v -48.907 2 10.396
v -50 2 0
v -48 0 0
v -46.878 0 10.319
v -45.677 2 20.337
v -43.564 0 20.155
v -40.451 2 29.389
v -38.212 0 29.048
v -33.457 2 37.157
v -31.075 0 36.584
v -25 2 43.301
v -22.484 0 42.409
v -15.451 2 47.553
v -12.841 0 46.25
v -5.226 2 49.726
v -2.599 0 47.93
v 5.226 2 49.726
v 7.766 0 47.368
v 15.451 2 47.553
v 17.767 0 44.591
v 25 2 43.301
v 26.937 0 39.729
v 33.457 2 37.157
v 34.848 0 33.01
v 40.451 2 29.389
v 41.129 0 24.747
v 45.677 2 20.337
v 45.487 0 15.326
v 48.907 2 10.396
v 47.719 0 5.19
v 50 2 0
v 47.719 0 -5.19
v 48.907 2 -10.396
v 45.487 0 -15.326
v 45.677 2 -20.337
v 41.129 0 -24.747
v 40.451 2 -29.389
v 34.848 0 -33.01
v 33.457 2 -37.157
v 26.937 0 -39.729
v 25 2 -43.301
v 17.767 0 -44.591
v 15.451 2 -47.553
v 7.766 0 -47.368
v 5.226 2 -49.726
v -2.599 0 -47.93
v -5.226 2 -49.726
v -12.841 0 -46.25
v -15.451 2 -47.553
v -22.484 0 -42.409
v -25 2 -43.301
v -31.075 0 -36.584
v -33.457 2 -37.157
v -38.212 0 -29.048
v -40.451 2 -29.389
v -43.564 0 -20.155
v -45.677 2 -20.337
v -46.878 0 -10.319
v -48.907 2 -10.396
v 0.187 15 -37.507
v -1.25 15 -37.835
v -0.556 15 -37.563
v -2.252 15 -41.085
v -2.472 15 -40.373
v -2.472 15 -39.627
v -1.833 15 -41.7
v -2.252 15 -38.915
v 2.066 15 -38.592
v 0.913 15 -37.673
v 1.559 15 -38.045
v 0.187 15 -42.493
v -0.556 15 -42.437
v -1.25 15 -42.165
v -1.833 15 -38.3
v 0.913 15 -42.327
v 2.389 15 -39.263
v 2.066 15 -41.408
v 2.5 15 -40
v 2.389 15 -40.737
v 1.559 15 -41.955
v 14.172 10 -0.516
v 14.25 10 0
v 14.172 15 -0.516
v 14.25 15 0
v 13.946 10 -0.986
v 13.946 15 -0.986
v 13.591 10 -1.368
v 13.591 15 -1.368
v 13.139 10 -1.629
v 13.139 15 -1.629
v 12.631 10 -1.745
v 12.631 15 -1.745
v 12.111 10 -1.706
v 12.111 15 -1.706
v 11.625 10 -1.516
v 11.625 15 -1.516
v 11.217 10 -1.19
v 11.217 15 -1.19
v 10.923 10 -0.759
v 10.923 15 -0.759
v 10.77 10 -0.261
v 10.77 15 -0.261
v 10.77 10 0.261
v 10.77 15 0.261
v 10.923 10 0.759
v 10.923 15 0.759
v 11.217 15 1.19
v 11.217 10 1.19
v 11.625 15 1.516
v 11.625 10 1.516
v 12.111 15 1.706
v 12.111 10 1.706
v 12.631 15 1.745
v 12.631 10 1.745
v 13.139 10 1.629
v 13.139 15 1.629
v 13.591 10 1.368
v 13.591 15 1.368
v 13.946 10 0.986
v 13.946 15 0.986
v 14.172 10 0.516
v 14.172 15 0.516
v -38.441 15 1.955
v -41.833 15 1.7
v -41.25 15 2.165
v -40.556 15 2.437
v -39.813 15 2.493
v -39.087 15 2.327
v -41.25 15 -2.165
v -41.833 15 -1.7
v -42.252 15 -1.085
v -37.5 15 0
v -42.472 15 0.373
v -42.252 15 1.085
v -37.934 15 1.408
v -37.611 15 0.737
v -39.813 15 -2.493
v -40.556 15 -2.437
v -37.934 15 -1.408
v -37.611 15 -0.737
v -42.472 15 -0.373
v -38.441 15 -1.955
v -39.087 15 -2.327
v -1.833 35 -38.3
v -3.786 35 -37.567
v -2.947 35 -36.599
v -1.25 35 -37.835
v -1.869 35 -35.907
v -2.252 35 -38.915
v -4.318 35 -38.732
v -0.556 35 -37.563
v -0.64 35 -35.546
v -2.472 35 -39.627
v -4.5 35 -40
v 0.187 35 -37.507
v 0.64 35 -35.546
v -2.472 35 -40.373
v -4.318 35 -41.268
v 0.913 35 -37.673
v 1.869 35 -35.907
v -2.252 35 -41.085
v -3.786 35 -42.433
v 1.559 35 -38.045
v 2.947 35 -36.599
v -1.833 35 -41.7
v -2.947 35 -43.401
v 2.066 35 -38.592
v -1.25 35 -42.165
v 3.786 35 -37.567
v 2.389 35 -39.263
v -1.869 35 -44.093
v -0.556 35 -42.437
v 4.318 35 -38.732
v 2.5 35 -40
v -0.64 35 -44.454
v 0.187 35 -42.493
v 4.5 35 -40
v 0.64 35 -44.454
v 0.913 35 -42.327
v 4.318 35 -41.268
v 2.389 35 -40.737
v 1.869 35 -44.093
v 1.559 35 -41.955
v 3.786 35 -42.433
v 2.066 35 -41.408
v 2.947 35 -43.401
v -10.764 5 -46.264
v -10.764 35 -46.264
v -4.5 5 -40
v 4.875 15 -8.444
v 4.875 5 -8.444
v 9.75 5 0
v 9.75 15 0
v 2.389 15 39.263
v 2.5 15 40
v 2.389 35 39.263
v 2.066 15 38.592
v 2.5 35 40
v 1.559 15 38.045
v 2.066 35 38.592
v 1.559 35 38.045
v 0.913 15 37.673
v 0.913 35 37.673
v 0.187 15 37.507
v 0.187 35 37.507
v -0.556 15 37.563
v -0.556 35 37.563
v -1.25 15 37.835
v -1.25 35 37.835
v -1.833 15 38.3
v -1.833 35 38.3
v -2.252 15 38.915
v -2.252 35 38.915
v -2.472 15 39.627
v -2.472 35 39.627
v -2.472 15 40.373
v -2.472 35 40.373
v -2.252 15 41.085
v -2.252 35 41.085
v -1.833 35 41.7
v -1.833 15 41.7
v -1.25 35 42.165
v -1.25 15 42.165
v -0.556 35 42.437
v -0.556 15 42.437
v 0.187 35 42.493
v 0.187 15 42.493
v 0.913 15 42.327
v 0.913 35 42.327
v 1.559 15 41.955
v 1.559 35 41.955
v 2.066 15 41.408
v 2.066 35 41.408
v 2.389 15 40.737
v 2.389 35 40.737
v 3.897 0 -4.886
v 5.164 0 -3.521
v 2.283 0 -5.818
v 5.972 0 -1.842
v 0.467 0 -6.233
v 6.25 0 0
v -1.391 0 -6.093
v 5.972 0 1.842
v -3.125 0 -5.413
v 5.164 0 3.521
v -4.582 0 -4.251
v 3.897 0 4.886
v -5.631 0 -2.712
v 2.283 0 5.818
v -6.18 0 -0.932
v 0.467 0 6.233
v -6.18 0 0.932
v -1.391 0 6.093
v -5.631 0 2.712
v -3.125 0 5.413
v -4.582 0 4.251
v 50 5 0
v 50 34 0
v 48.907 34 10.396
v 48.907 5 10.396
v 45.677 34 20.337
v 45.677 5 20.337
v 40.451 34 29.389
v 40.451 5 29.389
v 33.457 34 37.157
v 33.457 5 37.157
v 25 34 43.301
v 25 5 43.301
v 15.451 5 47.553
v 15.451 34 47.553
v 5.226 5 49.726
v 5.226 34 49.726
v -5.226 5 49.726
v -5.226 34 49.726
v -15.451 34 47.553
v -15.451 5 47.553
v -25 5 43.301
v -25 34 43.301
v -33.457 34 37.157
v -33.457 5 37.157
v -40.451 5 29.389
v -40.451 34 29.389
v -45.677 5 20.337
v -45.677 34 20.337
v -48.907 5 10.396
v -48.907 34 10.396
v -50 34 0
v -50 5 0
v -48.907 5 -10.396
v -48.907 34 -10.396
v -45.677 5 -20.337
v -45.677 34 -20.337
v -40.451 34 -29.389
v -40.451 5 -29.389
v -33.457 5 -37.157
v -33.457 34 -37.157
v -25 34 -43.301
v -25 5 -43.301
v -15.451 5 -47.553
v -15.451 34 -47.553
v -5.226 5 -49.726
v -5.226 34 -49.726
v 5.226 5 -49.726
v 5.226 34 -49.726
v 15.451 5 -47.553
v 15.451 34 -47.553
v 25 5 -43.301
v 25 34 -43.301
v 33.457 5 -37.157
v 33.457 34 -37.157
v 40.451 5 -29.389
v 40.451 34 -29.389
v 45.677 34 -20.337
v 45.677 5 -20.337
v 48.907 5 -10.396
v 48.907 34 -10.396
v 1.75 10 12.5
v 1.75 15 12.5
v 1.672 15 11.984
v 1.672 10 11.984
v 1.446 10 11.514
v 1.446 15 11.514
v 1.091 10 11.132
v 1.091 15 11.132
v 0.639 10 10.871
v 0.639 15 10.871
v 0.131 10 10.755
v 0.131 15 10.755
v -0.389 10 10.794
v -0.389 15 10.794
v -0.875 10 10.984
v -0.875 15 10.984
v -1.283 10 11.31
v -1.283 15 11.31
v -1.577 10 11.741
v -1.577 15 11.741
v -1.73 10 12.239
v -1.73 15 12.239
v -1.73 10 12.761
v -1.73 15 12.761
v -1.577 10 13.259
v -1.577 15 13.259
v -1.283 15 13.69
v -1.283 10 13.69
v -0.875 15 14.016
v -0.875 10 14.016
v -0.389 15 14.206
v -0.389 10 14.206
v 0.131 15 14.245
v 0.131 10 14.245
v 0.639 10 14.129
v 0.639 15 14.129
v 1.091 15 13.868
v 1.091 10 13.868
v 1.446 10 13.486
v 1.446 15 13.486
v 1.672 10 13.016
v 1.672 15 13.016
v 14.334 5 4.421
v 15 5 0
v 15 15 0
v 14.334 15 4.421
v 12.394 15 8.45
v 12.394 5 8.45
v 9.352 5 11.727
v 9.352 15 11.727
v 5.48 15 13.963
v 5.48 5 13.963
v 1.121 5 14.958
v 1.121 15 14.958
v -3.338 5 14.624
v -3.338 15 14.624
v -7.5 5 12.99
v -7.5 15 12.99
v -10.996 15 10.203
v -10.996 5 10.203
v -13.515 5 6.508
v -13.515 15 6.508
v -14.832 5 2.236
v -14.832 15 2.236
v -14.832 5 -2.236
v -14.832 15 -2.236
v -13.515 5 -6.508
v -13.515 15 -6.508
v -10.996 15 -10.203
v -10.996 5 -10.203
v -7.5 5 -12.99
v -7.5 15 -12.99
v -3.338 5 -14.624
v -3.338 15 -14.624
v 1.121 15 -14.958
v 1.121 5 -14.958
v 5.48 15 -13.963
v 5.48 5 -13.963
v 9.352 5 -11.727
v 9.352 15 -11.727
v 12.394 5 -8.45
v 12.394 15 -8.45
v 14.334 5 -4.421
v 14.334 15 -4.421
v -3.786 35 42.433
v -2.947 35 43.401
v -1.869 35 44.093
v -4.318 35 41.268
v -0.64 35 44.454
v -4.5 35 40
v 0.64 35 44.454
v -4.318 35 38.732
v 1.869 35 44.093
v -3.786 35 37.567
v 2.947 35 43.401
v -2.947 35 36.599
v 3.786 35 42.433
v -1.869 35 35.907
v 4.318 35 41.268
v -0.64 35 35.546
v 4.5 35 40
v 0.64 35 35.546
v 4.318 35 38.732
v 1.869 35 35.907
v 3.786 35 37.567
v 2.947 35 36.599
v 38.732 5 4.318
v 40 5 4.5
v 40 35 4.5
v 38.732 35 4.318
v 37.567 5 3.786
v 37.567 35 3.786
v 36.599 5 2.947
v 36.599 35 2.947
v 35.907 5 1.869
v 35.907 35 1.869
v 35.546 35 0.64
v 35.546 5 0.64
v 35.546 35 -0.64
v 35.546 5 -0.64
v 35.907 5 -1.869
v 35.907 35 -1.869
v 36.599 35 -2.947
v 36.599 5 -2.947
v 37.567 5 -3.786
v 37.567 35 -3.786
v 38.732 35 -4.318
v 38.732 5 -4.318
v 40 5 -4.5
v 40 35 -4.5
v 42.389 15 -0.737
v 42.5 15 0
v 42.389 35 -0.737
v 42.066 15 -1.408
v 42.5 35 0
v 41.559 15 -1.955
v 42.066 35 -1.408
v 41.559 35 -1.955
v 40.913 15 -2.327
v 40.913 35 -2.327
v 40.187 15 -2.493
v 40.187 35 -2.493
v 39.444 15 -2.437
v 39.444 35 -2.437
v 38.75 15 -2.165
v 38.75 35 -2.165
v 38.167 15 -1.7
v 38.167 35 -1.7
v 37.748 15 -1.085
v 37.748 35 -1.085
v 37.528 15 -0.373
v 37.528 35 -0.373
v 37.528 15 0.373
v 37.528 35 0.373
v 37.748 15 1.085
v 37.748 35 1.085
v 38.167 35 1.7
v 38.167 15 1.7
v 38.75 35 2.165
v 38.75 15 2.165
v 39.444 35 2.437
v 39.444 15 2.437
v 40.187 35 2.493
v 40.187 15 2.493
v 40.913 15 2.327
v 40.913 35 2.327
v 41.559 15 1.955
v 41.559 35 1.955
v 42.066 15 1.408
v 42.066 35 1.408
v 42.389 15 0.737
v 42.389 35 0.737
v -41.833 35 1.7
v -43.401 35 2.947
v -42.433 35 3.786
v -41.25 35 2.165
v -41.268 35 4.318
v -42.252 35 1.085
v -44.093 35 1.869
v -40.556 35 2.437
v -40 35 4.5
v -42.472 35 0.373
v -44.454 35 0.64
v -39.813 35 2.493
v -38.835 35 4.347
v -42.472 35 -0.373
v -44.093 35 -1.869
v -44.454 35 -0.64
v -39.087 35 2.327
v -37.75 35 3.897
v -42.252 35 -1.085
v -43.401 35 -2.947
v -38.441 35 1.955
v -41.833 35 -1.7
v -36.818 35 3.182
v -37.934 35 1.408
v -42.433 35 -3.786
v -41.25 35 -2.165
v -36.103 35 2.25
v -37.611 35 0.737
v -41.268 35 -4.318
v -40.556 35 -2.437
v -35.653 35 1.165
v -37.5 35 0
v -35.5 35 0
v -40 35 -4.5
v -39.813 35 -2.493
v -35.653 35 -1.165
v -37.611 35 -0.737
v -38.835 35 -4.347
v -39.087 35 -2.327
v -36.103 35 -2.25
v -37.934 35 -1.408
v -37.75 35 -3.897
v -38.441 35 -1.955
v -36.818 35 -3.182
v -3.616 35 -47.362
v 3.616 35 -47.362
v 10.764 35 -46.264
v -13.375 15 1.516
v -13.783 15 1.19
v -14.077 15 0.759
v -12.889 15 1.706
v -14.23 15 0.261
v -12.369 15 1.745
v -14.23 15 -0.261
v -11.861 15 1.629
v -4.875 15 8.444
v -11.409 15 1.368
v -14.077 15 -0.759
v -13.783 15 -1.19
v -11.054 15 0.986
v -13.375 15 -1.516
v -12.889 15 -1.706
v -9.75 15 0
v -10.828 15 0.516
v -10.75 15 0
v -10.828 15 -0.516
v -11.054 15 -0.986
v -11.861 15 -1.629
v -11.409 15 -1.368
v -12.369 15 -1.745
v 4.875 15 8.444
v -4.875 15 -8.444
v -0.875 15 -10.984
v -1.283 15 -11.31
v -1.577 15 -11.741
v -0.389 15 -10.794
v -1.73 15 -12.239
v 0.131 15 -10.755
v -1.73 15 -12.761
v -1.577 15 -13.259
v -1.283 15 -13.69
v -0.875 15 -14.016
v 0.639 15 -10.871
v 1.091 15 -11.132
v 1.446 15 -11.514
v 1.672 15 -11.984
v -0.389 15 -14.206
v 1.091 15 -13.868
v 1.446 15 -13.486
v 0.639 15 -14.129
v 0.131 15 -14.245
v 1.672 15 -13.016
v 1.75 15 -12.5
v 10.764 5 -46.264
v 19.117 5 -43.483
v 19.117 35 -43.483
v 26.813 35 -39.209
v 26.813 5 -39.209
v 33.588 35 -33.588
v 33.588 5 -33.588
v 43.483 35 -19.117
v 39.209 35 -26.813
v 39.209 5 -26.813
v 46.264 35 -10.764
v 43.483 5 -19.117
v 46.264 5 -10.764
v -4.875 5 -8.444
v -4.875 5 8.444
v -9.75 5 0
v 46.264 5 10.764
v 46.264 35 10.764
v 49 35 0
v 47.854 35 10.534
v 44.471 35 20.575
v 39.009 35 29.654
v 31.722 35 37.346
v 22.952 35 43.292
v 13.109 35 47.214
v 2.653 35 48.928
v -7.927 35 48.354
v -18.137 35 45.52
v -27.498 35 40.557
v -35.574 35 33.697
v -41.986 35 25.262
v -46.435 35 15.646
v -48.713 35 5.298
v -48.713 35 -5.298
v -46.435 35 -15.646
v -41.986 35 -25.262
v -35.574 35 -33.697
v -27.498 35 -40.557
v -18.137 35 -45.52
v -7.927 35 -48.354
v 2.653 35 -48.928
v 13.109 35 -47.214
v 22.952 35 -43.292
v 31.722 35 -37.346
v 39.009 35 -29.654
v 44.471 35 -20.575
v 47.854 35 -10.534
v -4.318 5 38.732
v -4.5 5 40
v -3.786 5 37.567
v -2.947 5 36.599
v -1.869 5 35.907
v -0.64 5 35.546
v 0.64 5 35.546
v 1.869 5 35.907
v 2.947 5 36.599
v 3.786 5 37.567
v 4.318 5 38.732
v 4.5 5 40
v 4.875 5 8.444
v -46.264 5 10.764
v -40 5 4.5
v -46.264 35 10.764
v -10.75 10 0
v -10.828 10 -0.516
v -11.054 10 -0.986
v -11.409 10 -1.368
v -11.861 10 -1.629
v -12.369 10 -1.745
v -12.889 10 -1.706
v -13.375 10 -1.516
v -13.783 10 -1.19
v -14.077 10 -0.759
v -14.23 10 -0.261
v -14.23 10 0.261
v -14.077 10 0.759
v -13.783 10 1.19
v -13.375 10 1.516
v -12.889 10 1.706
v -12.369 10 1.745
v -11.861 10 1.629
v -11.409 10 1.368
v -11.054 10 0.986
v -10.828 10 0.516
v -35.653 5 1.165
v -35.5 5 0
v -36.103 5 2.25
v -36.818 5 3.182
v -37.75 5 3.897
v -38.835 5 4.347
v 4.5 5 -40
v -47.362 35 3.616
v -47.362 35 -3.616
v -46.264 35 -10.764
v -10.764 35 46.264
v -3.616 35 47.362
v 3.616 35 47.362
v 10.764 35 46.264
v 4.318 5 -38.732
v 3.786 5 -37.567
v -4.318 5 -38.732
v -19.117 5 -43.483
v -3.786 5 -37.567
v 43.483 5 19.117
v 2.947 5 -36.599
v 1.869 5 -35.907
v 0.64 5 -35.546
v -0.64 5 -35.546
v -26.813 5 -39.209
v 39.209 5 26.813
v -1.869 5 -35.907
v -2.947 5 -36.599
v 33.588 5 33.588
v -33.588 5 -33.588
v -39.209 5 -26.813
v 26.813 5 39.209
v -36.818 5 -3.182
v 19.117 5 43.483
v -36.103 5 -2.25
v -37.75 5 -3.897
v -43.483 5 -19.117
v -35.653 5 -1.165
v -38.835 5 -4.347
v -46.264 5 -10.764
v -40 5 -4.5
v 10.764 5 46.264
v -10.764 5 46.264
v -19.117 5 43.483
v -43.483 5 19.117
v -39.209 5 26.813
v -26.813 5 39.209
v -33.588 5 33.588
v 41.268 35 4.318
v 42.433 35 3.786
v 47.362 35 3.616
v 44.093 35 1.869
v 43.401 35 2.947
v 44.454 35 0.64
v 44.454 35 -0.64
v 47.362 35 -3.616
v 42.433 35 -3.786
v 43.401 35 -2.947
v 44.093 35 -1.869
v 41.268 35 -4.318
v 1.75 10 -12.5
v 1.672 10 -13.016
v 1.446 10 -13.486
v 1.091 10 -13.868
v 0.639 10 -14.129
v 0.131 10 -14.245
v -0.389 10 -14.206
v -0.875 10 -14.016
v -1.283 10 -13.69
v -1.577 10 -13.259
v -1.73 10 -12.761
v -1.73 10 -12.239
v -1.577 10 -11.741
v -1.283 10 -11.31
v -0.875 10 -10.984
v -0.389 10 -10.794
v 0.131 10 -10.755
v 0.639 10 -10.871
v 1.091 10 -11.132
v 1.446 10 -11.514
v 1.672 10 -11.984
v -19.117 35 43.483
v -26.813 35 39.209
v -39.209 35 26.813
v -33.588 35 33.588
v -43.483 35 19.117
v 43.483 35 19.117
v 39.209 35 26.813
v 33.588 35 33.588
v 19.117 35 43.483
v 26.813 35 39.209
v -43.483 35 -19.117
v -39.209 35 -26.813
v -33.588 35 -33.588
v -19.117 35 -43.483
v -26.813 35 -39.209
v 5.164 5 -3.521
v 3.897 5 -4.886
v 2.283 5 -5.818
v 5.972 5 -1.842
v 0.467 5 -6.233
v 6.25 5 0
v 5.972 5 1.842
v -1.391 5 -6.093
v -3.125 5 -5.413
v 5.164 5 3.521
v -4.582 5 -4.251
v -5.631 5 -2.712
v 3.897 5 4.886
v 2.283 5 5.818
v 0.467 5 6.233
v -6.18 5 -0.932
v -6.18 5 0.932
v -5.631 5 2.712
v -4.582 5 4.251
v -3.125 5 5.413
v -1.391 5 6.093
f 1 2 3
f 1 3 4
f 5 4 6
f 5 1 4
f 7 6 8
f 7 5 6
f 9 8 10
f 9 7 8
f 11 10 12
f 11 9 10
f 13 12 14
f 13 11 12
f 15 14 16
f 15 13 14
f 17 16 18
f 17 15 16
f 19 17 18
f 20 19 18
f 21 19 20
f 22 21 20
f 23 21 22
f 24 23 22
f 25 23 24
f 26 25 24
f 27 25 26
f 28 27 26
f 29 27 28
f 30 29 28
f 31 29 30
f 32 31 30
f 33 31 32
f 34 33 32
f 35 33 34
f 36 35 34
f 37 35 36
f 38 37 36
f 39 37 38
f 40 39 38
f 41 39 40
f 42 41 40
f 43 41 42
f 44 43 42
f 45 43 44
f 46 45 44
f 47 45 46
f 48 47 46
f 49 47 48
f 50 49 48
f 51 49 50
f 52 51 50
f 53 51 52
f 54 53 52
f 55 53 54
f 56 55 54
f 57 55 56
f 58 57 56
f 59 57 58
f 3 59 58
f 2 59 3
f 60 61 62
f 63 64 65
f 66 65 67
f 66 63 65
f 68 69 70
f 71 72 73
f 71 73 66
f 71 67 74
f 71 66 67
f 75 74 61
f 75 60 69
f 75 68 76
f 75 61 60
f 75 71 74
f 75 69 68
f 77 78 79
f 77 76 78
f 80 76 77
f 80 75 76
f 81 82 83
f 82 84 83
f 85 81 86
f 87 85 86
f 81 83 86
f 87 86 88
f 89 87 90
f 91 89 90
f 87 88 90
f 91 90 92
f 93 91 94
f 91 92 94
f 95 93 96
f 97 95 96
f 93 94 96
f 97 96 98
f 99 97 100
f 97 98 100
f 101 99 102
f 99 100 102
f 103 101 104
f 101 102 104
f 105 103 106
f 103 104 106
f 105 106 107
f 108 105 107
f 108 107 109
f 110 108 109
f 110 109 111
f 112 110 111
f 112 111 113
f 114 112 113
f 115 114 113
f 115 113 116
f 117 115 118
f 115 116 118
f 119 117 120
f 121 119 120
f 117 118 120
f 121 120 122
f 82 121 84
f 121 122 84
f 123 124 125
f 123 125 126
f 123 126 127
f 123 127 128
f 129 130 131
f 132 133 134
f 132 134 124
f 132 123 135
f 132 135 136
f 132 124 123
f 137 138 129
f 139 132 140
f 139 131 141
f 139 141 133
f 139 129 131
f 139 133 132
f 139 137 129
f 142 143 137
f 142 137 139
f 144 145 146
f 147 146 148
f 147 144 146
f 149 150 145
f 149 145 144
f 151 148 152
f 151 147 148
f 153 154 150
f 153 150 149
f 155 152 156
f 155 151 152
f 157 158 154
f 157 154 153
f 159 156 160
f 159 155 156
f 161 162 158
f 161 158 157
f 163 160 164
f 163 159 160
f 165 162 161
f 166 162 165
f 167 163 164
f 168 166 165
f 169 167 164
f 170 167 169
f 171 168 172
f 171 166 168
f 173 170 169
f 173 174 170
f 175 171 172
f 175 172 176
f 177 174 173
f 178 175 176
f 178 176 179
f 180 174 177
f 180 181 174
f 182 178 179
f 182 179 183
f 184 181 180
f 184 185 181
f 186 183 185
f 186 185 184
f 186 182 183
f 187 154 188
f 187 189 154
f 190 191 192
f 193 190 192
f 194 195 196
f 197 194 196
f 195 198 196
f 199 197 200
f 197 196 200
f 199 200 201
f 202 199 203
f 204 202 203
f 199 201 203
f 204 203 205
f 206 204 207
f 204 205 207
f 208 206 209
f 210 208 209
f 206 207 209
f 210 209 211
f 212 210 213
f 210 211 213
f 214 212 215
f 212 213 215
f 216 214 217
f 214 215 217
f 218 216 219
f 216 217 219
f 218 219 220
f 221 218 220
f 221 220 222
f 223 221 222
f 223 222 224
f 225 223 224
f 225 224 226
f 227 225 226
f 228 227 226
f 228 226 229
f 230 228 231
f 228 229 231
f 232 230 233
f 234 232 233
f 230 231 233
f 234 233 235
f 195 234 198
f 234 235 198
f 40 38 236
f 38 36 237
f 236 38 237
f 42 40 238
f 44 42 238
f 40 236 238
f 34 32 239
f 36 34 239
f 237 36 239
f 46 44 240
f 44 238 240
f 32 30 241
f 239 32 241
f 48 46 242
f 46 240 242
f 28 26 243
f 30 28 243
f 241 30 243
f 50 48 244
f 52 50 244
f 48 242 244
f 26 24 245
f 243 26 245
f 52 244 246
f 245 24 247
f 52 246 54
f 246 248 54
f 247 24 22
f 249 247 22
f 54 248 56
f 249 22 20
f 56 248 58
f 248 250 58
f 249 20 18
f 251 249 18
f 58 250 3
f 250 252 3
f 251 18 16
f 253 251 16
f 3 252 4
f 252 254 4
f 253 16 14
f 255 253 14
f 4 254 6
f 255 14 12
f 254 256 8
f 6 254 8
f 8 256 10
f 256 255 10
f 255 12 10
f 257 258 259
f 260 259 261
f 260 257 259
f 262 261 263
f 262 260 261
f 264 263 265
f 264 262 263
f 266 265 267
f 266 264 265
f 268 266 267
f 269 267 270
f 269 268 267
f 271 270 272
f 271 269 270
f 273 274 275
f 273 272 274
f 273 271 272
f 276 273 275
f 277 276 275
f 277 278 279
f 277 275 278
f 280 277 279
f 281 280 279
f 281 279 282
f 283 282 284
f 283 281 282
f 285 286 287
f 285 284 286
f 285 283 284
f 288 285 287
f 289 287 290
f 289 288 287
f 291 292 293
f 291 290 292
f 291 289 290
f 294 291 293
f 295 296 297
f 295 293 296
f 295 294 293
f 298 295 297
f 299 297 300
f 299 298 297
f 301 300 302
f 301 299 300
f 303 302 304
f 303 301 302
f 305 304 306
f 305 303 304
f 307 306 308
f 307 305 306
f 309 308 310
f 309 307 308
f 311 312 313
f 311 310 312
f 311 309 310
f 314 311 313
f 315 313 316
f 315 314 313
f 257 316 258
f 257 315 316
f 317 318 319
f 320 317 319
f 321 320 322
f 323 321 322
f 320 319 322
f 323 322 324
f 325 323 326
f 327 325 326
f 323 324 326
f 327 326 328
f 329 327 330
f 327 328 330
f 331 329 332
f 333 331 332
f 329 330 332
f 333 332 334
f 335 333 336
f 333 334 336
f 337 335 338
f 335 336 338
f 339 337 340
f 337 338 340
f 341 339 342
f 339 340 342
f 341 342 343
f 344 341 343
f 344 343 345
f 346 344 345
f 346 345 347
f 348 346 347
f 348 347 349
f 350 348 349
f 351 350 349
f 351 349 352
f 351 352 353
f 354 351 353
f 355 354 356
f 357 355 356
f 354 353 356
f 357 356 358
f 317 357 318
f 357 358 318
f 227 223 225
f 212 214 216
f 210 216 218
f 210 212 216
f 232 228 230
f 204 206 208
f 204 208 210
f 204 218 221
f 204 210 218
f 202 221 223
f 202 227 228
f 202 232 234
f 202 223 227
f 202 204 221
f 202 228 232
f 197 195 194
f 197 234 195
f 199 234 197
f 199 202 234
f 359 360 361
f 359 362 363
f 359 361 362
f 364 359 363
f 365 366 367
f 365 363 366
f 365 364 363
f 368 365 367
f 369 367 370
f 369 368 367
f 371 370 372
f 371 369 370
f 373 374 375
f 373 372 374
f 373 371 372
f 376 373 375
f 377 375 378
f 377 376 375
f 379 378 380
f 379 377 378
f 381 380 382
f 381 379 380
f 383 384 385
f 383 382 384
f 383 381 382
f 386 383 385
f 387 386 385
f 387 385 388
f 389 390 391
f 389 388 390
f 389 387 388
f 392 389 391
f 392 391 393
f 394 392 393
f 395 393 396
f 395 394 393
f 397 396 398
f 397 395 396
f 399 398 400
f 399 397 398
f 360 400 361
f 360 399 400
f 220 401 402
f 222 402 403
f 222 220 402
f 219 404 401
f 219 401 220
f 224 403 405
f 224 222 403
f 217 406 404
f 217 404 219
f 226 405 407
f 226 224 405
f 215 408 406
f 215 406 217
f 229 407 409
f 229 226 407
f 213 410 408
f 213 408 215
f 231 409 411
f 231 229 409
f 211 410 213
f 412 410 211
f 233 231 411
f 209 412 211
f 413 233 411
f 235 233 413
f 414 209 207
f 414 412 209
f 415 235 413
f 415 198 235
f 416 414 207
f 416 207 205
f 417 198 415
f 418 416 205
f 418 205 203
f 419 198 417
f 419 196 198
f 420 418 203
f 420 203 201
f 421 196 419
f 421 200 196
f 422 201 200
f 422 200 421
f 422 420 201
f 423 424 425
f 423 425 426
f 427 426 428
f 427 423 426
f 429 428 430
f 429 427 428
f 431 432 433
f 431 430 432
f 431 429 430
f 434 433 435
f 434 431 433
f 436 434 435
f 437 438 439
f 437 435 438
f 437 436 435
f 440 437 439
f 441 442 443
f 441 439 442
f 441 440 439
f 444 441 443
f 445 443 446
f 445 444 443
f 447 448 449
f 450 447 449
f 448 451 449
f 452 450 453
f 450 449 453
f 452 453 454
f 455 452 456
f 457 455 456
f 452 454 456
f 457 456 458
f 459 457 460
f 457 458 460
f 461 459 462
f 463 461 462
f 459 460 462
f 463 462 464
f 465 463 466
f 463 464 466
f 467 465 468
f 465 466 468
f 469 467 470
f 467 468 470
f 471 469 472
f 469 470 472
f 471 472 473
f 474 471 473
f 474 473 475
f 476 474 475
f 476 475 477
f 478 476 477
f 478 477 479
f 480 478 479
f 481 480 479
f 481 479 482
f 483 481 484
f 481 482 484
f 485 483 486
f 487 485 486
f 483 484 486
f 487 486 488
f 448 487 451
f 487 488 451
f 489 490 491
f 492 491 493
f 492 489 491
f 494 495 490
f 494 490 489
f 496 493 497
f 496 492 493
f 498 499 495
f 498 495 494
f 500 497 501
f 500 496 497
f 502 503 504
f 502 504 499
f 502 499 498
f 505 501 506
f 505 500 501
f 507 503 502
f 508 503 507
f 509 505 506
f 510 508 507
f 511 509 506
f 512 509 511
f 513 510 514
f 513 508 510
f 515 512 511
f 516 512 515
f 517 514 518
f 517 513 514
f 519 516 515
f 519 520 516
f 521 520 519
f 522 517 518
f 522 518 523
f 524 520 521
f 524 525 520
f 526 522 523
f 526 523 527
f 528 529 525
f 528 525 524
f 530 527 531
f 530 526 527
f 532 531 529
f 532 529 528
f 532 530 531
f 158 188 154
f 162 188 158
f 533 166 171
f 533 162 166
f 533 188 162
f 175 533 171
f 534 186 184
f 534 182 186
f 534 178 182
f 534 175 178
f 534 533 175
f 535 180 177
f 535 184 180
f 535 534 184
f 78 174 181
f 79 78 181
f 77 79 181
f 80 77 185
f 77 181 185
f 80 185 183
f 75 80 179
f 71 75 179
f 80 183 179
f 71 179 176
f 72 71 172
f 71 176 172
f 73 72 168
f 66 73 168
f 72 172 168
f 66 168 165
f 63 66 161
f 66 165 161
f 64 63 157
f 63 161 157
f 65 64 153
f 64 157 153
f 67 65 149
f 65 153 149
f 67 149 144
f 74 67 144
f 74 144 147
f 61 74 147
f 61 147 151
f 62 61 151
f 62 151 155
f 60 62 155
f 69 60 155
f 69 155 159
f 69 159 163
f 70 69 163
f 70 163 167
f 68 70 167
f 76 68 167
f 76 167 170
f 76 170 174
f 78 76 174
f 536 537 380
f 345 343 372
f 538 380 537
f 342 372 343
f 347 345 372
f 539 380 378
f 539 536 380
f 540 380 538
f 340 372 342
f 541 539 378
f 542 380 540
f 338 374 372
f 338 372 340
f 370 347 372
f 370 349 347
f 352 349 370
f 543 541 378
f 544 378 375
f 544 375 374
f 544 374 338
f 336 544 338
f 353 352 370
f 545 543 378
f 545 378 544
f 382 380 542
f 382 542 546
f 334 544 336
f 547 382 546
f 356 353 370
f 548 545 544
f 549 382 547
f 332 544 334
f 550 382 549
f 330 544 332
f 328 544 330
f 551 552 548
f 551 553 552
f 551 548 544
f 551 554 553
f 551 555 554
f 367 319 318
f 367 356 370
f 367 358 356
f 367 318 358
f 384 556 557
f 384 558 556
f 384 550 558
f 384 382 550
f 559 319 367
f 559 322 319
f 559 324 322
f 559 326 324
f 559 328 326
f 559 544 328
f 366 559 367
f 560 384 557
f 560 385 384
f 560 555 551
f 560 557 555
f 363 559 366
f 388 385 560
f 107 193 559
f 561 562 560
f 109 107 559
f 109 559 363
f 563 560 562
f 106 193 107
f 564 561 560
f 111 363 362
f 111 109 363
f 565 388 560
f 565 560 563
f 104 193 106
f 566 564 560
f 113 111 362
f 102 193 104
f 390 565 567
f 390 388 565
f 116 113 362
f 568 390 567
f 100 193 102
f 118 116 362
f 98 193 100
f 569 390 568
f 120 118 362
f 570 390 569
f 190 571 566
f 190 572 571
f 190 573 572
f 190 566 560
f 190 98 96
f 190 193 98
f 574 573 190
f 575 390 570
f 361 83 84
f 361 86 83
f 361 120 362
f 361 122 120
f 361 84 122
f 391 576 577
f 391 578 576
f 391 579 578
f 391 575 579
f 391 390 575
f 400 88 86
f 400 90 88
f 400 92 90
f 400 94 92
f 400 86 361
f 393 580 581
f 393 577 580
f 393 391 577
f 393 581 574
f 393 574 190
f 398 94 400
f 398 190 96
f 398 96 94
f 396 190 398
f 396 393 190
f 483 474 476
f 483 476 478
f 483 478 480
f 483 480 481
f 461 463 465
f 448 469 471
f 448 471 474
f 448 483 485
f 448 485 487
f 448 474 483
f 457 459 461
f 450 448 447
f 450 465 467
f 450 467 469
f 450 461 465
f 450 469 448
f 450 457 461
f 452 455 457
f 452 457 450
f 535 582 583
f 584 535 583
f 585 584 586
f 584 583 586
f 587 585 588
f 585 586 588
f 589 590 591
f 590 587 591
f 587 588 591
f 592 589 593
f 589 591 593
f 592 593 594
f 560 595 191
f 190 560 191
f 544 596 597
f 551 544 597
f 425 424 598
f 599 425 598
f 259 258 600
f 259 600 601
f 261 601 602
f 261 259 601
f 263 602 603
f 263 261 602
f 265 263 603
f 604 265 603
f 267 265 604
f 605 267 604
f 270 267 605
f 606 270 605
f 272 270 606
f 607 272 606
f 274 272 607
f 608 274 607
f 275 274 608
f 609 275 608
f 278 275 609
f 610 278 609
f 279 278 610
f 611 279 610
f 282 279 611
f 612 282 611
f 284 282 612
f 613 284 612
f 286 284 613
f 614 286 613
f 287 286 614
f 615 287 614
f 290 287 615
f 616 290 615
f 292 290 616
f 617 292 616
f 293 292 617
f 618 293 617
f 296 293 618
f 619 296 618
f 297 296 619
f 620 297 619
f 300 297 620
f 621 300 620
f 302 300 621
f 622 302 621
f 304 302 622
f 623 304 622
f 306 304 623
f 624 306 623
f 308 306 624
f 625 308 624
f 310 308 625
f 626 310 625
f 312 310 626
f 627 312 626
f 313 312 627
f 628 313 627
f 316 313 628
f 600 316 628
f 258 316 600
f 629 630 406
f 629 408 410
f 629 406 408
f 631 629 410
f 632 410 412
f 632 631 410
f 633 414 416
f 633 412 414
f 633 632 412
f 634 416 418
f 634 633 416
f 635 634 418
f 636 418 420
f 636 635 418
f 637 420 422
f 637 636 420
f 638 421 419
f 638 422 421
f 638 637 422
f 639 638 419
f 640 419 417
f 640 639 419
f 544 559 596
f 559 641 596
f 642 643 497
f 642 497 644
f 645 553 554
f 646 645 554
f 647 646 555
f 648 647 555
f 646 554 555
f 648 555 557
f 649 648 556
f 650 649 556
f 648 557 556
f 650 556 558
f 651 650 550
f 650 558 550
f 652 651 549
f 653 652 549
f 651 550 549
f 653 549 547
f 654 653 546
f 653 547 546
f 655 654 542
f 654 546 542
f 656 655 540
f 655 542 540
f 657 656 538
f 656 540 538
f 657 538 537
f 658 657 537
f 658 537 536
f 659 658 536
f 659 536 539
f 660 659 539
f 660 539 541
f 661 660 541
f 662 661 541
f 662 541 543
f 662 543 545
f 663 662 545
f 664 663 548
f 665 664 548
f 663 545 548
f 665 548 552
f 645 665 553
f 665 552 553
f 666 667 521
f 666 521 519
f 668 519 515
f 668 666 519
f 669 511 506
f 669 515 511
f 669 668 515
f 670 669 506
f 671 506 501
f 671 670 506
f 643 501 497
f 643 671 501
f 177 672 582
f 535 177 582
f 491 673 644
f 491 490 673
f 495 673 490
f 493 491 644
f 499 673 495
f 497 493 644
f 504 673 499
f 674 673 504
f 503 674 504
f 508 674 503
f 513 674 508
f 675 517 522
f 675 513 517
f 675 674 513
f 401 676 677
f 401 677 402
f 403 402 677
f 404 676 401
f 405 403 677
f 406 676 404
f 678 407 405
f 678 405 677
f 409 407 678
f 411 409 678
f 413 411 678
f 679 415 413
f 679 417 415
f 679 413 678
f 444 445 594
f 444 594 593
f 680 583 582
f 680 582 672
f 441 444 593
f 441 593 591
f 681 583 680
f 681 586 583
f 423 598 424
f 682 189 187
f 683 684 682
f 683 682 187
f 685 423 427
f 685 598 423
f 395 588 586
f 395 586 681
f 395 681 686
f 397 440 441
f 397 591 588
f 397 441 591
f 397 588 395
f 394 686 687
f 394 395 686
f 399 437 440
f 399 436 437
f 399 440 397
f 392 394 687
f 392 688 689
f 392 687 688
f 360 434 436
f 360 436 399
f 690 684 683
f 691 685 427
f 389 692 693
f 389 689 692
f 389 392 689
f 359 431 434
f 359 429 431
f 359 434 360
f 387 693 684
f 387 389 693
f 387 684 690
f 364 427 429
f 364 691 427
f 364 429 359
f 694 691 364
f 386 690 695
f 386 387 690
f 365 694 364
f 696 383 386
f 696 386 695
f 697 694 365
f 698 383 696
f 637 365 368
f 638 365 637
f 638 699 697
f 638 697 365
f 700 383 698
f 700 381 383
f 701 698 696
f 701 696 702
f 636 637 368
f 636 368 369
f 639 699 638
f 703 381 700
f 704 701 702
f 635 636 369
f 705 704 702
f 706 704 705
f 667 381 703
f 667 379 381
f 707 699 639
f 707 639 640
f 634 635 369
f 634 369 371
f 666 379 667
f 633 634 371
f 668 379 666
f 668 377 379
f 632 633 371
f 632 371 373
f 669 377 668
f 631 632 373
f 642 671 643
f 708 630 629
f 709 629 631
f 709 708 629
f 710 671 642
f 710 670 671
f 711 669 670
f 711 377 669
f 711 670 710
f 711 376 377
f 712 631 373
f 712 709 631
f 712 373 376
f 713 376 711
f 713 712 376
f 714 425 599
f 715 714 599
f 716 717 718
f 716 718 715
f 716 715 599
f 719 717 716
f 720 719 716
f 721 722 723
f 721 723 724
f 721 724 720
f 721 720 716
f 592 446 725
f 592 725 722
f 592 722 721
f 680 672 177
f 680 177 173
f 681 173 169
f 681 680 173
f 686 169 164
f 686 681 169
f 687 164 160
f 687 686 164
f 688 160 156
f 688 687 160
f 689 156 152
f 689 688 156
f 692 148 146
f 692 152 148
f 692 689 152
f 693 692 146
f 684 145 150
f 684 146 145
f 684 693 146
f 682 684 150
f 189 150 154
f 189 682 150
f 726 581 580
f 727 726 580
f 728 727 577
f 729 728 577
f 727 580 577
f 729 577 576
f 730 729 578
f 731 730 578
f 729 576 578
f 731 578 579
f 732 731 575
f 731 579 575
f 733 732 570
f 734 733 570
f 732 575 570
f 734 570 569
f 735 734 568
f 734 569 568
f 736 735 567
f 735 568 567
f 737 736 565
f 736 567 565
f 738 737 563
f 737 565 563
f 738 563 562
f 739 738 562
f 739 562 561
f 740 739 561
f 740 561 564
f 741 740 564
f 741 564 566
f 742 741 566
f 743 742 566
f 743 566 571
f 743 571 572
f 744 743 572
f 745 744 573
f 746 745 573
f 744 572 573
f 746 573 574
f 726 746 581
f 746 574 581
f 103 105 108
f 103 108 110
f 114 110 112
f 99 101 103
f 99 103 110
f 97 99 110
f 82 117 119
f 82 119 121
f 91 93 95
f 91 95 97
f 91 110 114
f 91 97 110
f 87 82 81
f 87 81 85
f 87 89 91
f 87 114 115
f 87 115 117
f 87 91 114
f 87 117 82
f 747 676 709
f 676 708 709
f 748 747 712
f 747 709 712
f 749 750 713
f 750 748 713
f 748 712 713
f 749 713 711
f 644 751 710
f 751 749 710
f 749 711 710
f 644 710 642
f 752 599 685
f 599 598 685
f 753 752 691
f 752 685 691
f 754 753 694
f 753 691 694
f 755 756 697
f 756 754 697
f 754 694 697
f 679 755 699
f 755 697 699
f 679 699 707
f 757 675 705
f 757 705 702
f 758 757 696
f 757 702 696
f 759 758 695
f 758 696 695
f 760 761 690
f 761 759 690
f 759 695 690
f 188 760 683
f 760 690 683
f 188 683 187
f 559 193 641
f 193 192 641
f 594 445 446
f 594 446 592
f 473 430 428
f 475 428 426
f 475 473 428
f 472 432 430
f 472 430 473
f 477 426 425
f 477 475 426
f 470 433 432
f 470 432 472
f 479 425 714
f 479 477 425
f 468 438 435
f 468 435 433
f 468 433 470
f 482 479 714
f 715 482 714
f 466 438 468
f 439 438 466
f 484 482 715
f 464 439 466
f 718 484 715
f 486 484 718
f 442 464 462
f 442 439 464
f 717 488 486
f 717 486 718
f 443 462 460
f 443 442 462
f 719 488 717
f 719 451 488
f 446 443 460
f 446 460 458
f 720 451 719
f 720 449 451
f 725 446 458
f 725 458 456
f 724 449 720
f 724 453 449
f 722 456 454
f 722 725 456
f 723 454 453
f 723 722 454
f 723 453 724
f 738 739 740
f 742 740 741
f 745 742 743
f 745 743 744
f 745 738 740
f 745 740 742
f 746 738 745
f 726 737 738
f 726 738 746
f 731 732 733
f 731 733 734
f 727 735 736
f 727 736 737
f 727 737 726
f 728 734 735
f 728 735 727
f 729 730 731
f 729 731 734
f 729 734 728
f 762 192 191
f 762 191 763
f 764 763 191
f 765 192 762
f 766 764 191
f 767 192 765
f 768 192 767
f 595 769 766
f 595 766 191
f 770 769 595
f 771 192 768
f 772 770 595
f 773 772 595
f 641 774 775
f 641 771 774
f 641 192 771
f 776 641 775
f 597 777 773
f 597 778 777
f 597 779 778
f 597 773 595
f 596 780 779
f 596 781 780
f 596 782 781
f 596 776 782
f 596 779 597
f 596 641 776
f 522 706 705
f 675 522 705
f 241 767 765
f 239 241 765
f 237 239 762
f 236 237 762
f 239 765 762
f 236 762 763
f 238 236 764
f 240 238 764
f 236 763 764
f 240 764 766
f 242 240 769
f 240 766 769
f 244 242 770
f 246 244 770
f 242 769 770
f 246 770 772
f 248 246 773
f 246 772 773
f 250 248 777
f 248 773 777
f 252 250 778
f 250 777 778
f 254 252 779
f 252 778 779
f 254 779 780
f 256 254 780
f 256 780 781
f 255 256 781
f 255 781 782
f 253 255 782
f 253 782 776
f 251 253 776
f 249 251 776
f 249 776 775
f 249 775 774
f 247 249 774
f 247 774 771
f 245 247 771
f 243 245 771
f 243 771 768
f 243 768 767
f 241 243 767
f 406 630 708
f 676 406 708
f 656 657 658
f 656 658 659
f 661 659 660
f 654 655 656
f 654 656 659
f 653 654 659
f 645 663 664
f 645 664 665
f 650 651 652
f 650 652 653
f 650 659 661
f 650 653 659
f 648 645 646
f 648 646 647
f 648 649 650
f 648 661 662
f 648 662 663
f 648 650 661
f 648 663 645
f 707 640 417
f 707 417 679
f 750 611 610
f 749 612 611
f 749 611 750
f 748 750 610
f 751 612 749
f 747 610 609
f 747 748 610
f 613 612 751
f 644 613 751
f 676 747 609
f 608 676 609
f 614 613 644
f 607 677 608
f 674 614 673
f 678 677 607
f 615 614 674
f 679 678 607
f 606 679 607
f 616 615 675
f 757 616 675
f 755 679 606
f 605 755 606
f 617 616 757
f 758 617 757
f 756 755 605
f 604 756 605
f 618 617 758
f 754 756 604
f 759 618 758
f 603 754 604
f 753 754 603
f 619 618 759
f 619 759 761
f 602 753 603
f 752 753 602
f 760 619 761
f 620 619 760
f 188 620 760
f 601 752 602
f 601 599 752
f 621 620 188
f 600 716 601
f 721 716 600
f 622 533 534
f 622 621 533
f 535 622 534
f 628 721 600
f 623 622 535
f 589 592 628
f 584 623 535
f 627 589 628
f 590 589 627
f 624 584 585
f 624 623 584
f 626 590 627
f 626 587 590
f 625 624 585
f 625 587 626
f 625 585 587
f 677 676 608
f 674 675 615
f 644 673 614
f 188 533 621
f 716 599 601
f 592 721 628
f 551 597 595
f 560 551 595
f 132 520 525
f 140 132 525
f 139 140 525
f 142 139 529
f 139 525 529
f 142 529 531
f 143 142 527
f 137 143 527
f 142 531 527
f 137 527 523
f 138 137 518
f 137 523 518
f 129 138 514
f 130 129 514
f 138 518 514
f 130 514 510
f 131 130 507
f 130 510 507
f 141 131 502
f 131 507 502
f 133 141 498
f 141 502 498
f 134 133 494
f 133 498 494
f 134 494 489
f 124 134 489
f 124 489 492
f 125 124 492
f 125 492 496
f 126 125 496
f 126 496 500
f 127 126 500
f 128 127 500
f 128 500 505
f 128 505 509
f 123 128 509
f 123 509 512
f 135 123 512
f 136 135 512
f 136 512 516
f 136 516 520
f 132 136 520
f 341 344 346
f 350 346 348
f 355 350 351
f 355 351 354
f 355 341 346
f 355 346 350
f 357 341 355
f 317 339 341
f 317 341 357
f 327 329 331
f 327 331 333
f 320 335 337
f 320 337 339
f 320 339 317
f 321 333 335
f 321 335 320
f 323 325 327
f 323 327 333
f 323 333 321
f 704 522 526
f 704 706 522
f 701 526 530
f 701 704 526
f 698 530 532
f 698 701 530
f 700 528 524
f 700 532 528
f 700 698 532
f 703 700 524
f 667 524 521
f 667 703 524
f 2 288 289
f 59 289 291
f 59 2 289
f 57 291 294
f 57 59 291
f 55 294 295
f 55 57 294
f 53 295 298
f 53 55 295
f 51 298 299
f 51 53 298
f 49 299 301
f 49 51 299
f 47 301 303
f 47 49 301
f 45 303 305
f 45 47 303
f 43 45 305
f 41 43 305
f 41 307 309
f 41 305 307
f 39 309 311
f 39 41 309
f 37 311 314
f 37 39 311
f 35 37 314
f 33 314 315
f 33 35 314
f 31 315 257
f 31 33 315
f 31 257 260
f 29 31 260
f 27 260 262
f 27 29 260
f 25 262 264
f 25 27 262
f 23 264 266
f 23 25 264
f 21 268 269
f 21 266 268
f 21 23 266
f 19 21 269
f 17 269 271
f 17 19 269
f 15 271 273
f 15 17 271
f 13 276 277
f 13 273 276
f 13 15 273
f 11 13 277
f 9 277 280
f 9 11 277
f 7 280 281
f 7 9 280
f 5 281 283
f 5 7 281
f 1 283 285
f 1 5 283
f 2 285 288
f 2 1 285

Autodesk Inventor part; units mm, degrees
ref_plane "YZ Plane" through (0, 0, 0) normal (1, 0, 0) x (0, 1, 0)
ref_plane "XZ Plane" through (0, 0, 0) normal (0, 1, 0) x (-1, 0, 0)
ref_plane "XY Plane" through (0, 0, 0) normal (0, 0, 1) x (1, 0, 0)
sketch "Sketch5" plane through (0, 0, 0) normal (0, 1, 0) x (-1, 0, 0)
  circle A0 centre (0, 0) radius 50
  dimension "d10" = 100
extrude "Extrusion4" add sketch "Sketch5" along normal blind 5
sketch "Sketch6" plane through (0, 5, 0) normal (0, 1, 0) x (1, 0, 0)
  circle A0 centre (0, 0) radius 6.25
  dimension "d13" = 12.5
extrude "Extrusion5" cut sketch "Sketch6" against normal blind 5
sketch "Sketch7" plane through (0, 5, 0) normal (0, 1, 0) x (1, 0, 0)
  circle A0 centre (0, 0) radius 50 construction
  line L0 (9.75, 0) -> (4.875, -8.4437)
  line L1 (4.875, -8.4437) -> (-4.875, -8.4437)
  line L2 (-4.875, -8.4437) -> (-9.75, 0)
  line L3 (-9.75, 0) -> (-4.875, 8.4437)
  line L4 (-4.875, 8.4437) -> (4.875, 8.4437)
  line L5 (4.875, 8.4437) -> (9.75, 0)
  line L6 (0, 0) -> (50, 0) construction
  circle A1 centre (0, 0) radius 15
  dimension "d20" = 19.5
  dimension "d21" = 30
extrude "Extrusion6" add sketch "Sketch7" along normal blind 10
sketch "Sketch8" plane through (0, 15, 0) normal (0, 1, 0) x (1, 0, 0)
  circle A0 centre (0, 0) radius 12.5 construction
  line L0 (0, 12.5) -> (0, -12.5) construction
  line L1 (-12.5, 0) -> (12.5, 0) construction
  circle A1 centre (0, 12.5) radius 1.75
  circle A2 centre (-12.5, 0) radius 1.75
  circle A3 centre (0, -12.5) radius 1.75
  circle A4 centre (12.5, 0) radius 1.75
  dimension "d24" = 25
  dimension "d25" = 3.5
  dimension "d26" = 3.5
  dimension "d27" = 3.5
  dimension "d28" = 3.5
extrude "Extrusion7" cut sketch "Sketch8" against normal blind 5
sketch "Sketch9" plane through (0, 5, 0) normal (0, 1, 0) x (1, 0, 0)
  circle A0 centre (0, 0) radius 50
  circle A1 centre (0, 0) radius 47.5
  dimension "d31" = 95
extrude "Extrusion8" add sketch "Sketch9" along normal blind 30
sketch "Sketch10" plane through (0, 5, 0) normal (0, 1, 0) x (1, 0, 0)
  circle A0 centre (0, 0) radius 40 construction
  line L0 (40, 0) -> (-40, 0) construction
  line L1 (0, 40) -> (0, -40) construction
  circle A1 centre (40, 0) radius 4.5
  circle A2 centre (0, 40) radius 4.5
  circle A3 centre (0, -40) radius 4.5
  circle A4 centre (-40, 0) radius 4.5
  dimension "d34" = 80
  dimension "d35" = 9
  dimension "d36" = 9
  dimension "d37" = 9
  dimension "d38" = 9
extrude "Extrusion9" add sketch "Sketch10" along normal blind 30
sketch "Sketch11" plane through (40, 35, 0) normal (0, 1, 0) x (1, 0, 0)
  circle A0 centre (0, 0) radius 2.5
  point P0 (-40, 0)
  dimension "d41" = 5
extrude "Extrusion10" cut sketch "Sketch11" against normal blind 20
sketch "Sketch12" plane through (0, 35, -40) normal (0, 1, 0) x (1, 0, 0)
  circle A0 centre (0, 0) radius 2.5
  point P0 (0, -40)
  dimension "d44" = 5
extrude "Extrusion11" cut sketch "Sketch12" against normal blind 20
sketch "Sketch13" plane through (-40, 35, 0) normal (0, 1, 0) x (1, 0, 0)
  circle A0 centre (0, 0) radius 2.5
  point P0 (40, 0)
  dimension "d47" = 5
extrude "Extrusion12" cut sketch "Sketch13" against normal blind 20
sketch "Sketch14" plane through (0, 35, 40) normal (0, 1, 0) x (1, 0, 0)
  circle A0 centre (0, 0) radius 2.5
  point P0 (0, 40)
  dimension "d50" = 5
extrude "Extrusion13" cut sketch "Sketch14" against normal blind 20
sketch "Sketch16" plane through (0, 5, 0) normal (0, 1, 0) x (1, 0, 0)
  circle A0 centre (0, 0) radius 47.5 construction
  line L0 (0, 47.5) -> (0, -47.5) construction
  line L1 (-47.5, 0) -> (47.5, 0) construction
  circle A1 centre (-40, 0) radius 2.5 construction
  circle A2 centre (-40, 0) radius 4.5 construction
  circle A3 centre (-40, 0) radius 4.5 construction
  line L2 (-40, 4.5) -> (-40, -4.5) construction
  circle A4 centre (0, 0) radius 47.5 construction
  line L3 (-40, 4.5) -> (-46.2643, 10.7643)
  line L4 (-40, 4.5) -> (-31.141, 4.5) construction
  line L5 (-40, -4.5) -> (-46.2643, -10.7643)
  arc A5 (-46.2643, 10.7643) -> (-46.2643, -10.7643) centre (0, 0) ccw
  arc A6 (-40, 4.5) -> (-40, -4.5) centre (-40, 0) ccw
  circle A7 centre (0, 0) radius 47.5 construction
  circle A8 centre (40, 0) radius 4.5 construction
  circle A9 centre (0, 0) radius 47.5 construction
  line L6 (40, 4.5) -> (46.2643, 10.7643)
  line L7 (40, -4.5) -> (46.2643, -10.7643)
  arc A10 (46.2643, -10.7643) -> (46.2643, 10.7643) centre (0, 0) ccw
  arc A11 (40, -4.5) -> (40, 4.5) centre (40, 0) ccw
  circle A12 centre (0, -40) radius 2.5 construction
  circle A13 centre (0, -40) radius 4.5 construction
  circle A14 centre (0, -40) radius 4.5 construction
  line L8 (4.5, -40) -> (-4.5, -40) construction
  line L9 (-4.5, -40) -> (-10.7643, -46.2643)
  line L10 (4.5, -40) -> (10.7643, -46.2643)
  arc A15 (-10.7643, -46.2643) -> (10.7643, -46.2643) centre (0, 0) ccw
  arc A16 (-4.5, -40) -> (4.5, -40) centre (0, -40) ccw
  line L11 (-4.5, 40) -> (-10.7643, 46.2643)
  line L12 (4.5, 40) -> (10.7643, 46.2643)
  arc A17 (10.7643, 46.2643) -> (-10.7643, 46.2643) centre (0, 0) ccw
  arc A18 (4.5, 40) -> (-4.5, 40) centre (0, 40) ccw
  dimension "d54" = 135
extrude "Extrusion14" add sketch "Sketch16" along normal blind 30
chamfer "Chamfer1" distance 1 angle 45 1 edges at (-50, 35, 0)
chamfer "Chamfer2" distance 2 angle 45 1 edges at (50, 0, 0)
properties part number "ground_support_0"
